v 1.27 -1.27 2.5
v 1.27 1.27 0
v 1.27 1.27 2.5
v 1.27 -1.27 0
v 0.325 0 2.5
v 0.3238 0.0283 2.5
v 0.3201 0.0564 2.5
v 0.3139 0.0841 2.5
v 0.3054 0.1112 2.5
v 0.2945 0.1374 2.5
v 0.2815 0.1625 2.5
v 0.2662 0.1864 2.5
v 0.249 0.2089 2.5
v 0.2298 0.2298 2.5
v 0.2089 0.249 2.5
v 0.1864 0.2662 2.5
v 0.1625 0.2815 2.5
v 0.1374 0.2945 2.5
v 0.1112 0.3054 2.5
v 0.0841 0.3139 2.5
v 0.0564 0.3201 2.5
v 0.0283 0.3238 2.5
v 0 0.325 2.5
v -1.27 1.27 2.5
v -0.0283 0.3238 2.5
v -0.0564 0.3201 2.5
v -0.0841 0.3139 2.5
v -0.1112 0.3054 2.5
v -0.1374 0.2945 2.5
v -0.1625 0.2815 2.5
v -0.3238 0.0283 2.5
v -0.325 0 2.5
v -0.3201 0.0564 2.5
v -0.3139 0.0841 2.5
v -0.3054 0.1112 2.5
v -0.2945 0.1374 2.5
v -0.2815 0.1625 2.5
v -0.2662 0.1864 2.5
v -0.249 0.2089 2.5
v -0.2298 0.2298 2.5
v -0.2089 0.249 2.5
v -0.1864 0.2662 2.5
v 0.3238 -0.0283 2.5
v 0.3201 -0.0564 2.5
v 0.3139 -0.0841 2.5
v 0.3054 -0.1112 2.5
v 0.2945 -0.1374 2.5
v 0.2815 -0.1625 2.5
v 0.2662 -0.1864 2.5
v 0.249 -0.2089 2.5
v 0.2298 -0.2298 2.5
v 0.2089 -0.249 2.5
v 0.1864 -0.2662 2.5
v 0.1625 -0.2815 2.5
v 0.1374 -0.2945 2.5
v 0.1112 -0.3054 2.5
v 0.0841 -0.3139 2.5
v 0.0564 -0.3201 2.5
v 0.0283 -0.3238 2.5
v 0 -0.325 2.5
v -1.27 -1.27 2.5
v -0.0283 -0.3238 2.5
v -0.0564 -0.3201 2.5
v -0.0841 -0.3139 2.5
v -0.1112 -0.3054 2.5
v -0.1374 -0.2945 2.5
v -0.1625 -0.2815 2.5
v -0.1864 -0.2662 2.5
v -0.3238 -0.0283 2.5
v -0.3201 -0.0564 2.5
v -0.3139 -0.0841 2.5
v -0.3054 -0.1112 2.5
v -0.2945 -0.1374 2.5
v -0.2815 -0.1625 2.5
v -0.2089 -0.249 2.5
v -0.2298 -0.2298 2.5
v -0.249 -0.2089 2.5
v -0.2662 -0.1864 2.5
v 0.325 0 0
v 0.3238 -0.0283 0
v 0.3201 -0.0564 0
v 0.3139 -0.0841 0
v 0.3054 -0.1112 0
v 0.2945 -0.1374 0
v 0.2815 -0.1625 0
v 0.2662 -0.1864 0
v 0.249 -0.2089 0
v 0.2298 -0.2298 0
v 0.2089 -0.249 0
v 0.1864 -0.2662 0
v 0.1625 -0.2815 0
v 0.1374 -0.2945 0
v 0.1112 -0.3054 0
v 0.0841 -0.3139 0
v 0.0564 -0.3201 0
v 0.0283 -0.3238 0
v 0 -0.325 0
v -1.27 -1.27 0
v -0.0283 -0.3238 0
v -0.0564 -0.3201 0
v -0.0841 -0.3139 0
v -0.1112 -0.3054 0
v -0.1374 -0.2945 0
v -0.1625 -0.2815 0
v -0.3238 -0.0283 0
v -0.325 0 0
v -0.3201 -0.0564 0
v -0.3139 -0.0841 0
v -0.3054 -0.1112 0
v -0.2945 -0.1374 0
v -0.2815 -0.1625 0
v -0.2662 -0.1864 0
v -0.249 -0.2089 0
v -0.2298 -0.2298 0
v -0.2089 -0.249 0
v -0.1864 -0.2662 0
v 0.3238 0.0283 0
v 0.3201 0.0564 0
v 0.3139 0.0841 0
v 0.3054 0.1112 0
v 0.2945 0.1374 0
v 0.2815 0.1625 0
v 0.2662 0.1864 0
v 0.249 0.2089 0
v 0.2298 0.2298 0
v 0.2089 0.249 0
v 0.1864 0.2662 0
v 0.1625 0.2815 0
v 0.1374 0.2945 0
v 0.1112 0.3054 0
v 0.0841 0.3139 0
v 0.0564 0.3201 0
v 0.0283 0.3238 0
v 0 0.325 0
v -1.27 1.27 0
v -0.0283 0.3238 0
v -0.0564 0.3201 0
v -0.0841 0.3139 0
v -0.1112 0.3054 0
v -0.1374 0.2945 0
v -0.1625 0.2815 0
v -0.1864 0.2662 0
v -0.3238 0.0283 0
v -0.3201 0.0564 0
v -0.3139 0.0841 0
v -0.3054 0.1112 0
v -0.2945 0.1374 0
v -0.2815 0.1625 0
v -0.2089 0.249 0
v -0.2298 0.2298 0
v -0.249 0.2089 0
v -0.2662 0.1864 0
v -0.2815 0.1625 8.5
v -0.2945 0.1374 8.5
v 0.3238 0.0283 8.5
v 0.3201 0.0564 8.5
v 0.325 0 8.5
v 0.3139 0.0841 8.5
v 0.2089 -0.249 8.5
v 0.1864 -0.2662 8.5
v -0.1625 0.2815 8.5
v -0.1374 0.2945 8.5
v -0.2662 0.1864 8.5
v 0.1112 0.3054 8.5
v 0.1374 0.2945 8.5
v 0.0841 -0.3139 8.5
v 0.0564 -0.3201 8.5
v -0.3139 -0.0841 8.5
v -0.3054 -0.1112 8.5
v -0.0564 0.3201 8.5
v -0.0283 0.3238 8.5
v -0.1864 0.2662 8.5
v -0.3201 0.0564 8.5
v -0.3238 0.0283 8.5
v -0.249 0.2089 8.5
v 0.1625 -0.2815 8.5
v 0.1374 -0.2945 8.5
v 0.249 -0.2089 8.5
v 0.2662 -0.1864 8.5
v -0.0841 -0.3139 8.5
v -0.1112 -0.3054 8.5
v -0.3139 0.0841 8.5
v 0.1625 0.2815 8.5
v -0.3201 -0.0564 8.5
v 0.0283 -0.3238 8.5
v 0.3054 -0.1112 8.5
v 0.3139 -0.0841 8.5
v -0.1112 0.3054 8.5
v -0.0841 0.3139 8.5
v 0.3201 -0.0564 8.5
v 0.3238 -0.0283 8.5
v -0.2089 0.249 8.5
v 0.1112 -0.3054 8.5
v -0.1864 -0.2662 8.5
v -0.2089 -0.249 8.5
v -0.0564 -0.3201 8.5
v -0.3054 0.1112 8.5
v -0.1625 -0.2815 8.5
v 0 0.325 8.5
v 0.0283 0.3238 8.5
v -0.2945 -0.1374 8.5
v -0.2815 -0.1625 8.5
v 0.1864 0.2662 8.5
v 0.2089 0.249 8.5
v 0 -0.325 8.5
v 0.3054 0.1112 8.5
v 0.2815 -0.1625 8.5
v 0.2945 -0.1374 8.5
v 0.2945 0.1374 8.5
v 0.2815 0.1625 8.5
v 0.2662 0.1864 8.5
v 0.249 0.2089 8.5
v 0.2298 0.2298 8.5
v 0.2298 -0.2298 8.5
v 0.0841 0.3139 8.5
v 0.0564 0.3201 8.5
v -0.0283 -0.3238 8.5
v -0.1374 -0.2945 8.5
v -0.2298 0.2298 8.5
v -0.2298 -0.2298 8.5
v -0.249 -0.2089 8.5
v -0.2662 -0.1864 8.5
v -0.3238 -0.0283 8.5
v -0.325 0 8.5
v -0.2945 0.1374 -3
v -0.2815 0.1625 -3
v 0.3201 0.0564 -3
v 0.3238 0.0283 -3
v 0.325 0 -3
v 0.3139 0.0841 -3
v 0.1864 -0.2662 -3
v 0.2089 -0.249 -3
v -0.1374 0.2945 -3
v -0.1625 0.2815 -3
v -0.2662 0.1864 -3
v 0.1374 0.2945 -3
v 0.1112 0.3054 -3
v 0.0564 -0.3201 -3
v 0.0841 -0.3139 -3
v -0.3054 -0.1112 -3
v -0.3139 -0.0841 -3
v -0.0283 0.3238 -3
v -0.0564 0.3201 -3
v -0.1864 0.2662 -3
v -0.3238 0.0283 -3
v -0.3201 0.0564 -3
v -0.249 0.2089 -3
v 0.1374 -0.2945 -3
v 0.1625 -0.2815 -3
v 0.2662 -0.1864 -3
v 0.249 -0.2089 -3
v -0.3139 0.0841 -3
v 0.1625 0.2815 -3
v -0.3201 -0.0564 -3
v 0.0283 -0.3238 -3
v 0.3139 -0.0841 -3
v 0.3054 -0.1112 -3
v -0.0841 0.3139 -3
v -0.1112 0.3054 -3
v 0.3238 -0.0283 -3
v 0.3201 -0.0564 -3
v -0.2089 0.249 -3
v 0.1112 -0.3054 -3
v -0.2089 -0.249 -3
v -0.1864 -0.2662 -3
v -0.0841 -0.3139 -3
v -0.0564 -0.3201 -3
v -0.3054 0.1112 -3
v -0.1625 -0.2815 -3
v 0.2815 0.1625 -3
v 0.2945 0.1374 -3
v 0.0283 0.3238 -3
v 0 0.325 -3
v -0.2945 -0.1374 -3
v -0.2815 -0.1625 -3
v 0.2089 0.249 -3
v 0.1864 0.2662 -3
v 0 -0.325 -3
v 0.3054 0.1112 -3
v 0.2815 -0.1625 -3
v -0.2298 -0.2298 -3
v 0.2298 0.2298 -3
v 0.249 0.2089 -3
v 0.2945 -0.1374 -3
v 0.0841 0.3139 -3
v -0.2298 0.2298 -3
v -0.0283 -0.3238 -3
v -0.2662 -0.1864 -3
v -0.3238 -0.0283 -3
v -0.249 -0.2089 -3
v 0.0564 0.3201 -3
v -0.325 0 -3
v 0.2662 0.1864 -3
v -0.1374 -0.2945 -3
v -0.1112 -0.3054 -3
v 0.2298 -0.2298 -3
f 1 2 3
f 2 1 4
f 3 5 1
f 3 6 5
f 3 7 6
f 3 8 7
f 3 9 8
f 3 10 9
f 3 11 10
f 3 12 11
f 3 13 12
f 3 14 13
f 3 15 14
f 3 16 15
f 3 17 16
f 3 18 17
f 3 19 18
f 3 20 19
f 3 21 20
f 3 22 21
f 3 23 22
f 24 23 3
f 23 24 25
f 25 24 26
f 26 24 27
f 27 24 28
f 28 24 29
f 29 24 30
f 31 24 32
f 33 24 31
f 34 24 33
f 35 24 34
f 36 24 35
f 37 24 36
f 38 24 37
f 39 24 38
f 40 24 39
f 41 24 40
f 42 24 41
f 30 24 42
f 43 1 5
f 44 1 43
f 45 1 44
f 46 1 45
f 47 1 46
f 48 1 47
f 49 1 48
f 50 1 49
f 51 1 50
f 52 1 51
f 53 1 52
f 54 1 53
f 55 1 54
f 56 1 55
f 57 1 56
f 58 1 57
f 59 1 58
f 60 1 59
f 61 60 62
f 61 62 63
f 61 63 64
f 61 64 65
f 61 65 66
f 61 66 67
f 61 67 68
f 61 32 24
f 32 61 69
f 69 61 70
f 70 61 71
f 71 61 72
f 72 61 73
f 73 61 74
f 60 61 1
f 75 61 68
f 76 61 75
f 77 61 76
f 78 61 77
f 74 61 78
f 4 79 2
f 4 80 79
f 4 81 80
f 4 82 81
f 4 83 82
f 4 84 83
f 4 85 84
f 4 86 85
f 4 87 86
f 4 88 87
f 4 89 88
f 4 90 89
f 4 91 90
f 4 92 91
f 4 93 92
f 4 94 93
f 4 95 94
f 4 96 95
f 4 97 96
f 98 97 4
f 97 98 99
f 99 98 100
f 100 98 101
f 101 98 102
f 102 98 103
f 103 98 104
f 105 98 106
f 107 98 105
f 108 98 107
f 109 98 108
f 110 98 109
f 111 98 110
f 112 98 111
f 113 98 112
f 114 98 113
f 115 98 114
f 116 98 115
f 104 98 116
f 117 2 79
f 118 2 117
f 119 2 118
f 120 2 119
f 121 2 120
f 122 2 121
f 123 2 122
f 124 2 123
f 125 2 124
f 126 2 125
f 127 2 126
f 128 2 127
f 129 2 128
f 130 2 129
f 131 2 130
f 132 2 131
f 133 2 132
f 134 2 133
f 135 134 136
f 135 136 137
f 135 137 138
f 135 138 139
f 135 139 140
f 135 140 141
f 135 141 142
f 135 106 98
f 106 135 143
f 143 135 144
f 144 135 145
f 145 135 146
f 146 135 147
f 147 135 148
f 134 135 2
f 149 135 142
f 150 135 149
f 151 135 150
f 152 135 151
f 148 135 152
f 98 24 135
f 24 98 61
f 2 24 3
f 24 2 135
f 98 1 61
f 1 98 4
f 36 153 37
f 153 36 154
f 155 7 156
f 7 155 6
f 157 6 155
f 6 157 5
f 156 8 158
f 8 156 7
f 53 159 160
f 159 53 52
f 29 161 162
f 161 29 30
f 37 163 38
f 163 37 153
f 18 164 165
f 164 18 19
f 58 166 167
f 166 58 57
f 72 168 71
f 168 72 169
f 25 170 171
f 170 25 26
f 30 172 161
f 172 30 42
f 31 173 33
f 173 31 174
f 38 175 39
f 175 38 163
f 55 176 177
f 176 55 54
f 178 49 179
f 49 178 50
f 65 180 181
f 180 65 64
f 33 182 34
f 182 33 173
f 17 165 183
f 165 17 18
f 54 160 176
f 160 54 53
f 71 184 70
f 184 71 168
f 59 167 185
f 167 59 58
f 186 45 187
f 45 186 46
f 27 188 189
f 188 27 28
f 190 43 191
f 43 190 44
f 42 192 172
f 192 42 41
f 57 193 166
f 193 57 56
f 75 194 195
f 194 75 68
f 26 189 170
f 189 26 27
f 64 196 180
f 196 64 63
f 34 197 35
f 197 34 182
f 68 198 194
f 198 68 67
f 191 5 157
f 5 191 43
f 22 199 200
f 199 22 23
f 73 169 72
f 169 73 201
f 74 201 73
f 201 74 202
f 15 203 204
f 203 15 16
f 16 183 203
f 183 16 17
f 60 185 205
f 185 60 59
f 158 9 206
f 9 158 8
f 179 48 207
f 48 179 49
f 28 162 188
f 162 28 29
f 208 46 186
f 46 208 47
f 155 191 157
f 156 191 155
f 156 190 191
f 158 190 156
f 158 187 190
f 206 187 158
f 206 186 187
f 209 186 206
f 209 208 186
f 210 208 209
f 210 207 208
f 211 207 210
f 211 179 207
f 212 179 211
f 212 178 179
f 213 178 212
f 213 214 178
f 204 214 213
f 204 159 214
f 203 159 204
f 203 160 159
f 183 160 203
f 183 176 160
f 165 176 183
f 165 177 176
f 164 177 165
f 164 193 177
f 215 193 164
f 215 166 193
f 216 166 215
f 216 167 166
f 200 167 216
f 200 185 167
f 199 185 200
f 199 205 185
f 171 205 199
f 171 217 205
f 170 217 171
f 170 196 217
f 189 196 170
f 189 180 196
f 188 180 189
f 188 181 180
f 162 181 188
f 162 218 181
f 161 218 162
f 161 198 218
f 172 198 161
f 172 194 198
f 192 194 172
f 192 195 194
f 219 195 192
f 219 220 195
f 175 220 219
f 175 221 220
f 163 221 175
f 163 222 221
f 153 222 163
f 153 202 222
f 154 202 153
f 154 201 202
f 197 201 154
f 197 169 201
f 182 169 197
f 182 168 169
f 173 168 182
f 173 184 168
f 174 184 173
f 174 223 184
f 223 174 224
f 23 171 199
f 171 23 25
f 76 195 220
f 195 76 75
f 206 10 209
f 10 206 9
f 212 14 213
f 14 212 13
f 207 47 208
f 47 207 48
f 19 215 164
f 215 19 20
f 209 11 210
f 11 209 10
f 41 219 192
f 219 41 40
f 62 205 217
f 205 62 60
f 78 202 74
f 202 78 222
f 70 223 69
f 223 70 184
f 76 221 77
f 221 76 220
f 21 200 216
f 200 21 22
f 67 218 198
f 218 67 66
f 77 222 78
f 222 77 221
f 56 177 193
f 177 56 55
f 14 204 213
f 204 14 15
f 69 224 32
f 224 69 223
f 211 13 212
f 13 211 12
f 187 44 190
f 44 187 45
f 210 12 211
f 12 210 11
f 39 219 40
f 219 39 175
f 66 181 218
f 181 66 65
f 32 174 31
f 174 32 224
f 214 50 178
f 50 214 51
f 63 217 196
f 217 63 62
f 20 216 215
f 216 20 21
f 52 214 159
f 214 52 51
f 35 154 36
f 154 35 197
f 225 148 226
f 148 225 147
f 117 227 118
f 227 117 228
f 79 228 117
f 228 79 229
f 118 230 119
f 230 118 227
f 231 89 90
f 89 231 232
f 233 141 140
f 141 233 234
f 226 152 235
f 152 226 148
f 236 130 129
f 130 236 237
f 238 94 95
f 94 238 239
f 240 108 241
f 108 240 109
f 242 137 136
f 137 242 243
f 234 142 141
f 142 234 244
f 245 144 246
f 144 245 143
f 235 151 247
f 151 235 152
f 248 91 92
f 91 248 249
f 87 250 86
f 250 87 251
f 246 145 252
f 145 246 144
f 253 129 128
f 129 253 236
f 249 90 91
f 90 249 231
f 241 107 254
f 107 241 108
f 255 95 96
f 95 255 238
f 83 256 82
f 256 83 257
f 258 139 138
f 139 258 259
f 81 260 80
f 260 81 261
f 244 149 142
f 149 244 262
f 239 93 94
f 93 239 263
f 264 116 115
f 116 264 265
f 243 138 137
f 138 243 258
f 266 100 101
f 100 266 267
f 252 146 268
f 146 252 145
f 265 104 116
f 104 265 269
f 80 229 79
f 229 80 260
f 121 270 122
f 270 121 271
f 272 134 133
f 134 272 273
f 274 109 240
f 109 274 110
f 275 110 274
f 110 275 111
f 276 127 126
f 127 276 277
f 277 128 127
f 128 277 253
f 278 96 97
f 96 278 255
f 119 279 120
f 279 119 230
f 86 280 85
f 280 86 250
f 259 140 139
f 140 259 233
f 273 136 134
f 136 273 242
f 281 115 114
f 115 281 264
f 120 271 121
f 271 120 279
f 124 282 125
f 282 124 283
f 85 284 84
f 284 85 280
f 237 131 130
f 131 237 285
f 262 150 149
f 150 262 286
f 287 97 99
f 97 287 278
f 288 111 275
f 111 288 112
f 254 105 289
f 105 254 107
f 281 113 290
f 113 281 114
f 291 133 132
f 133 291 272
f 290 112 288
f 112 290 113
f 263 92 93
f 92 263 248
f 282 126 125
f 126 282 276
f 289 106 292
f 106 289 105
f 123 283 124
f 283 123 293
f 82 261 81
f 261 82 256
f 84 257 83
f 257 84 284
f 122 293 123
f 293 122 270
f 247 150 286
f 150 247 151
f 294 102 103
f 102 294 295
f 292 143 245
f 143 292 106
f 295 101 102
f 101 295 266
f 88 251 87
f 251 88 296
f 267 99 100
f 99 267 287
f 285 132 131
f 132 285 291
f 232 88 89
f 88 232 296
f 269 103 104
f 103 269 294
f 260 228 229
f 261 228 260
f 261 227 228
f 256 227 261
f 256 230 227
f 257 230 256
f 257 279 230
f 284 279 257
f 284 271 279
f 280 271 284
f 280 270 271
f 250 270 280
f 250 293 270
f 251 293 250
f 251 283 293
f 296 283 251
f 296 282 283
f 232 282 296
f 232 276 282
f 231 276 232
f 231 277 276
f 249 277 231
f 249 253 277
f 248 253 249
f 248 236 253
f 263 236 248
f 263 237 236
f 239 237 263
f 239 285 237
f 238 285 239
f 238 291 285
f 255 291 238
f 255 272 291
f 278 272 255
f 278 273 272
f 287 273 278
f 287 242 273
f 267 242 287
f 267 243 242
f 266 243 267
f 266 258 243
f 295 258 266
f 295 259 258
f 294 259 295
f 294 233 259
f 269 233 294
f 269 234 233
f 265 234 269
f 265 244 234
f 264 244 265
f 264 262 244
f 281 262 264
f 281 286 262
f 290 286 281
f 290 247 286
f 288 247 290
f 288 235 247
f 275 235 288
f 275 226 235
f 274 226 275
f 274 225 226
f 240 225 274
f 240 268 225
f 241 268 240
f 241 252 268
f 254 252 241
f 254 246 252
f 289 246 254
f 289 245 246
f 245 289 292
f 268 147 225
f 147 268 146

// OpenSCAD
$fn = 72;

pin_header();

module straight_pin()
{
    union()
    {
        // Plastic
        color("black")
        translate([0,0,1.25])
        cube([2.54, 2.54, 2.5], center=true);
        
        // Connection Pin
        color("gold")
        translate([0,0,2.5])
        cylinder(d=.65, h=6);
        
        // Soldering pin
        color("gold")
        translate([0,0,-3])
        cylinder(d=.65, h=3);
    }
}

module pin_header(rows=1, columns=1)
{
    translate([-(columns - 1) * 1.27, -(rows - 1) * 1.27,0])
    for (r = [0:(rows-1)])
    {
        for (c = [0:(columns-1)])
        {
            translate([c*2.54,r*2.54,0])
            straight_pin();
        }
    }
}
